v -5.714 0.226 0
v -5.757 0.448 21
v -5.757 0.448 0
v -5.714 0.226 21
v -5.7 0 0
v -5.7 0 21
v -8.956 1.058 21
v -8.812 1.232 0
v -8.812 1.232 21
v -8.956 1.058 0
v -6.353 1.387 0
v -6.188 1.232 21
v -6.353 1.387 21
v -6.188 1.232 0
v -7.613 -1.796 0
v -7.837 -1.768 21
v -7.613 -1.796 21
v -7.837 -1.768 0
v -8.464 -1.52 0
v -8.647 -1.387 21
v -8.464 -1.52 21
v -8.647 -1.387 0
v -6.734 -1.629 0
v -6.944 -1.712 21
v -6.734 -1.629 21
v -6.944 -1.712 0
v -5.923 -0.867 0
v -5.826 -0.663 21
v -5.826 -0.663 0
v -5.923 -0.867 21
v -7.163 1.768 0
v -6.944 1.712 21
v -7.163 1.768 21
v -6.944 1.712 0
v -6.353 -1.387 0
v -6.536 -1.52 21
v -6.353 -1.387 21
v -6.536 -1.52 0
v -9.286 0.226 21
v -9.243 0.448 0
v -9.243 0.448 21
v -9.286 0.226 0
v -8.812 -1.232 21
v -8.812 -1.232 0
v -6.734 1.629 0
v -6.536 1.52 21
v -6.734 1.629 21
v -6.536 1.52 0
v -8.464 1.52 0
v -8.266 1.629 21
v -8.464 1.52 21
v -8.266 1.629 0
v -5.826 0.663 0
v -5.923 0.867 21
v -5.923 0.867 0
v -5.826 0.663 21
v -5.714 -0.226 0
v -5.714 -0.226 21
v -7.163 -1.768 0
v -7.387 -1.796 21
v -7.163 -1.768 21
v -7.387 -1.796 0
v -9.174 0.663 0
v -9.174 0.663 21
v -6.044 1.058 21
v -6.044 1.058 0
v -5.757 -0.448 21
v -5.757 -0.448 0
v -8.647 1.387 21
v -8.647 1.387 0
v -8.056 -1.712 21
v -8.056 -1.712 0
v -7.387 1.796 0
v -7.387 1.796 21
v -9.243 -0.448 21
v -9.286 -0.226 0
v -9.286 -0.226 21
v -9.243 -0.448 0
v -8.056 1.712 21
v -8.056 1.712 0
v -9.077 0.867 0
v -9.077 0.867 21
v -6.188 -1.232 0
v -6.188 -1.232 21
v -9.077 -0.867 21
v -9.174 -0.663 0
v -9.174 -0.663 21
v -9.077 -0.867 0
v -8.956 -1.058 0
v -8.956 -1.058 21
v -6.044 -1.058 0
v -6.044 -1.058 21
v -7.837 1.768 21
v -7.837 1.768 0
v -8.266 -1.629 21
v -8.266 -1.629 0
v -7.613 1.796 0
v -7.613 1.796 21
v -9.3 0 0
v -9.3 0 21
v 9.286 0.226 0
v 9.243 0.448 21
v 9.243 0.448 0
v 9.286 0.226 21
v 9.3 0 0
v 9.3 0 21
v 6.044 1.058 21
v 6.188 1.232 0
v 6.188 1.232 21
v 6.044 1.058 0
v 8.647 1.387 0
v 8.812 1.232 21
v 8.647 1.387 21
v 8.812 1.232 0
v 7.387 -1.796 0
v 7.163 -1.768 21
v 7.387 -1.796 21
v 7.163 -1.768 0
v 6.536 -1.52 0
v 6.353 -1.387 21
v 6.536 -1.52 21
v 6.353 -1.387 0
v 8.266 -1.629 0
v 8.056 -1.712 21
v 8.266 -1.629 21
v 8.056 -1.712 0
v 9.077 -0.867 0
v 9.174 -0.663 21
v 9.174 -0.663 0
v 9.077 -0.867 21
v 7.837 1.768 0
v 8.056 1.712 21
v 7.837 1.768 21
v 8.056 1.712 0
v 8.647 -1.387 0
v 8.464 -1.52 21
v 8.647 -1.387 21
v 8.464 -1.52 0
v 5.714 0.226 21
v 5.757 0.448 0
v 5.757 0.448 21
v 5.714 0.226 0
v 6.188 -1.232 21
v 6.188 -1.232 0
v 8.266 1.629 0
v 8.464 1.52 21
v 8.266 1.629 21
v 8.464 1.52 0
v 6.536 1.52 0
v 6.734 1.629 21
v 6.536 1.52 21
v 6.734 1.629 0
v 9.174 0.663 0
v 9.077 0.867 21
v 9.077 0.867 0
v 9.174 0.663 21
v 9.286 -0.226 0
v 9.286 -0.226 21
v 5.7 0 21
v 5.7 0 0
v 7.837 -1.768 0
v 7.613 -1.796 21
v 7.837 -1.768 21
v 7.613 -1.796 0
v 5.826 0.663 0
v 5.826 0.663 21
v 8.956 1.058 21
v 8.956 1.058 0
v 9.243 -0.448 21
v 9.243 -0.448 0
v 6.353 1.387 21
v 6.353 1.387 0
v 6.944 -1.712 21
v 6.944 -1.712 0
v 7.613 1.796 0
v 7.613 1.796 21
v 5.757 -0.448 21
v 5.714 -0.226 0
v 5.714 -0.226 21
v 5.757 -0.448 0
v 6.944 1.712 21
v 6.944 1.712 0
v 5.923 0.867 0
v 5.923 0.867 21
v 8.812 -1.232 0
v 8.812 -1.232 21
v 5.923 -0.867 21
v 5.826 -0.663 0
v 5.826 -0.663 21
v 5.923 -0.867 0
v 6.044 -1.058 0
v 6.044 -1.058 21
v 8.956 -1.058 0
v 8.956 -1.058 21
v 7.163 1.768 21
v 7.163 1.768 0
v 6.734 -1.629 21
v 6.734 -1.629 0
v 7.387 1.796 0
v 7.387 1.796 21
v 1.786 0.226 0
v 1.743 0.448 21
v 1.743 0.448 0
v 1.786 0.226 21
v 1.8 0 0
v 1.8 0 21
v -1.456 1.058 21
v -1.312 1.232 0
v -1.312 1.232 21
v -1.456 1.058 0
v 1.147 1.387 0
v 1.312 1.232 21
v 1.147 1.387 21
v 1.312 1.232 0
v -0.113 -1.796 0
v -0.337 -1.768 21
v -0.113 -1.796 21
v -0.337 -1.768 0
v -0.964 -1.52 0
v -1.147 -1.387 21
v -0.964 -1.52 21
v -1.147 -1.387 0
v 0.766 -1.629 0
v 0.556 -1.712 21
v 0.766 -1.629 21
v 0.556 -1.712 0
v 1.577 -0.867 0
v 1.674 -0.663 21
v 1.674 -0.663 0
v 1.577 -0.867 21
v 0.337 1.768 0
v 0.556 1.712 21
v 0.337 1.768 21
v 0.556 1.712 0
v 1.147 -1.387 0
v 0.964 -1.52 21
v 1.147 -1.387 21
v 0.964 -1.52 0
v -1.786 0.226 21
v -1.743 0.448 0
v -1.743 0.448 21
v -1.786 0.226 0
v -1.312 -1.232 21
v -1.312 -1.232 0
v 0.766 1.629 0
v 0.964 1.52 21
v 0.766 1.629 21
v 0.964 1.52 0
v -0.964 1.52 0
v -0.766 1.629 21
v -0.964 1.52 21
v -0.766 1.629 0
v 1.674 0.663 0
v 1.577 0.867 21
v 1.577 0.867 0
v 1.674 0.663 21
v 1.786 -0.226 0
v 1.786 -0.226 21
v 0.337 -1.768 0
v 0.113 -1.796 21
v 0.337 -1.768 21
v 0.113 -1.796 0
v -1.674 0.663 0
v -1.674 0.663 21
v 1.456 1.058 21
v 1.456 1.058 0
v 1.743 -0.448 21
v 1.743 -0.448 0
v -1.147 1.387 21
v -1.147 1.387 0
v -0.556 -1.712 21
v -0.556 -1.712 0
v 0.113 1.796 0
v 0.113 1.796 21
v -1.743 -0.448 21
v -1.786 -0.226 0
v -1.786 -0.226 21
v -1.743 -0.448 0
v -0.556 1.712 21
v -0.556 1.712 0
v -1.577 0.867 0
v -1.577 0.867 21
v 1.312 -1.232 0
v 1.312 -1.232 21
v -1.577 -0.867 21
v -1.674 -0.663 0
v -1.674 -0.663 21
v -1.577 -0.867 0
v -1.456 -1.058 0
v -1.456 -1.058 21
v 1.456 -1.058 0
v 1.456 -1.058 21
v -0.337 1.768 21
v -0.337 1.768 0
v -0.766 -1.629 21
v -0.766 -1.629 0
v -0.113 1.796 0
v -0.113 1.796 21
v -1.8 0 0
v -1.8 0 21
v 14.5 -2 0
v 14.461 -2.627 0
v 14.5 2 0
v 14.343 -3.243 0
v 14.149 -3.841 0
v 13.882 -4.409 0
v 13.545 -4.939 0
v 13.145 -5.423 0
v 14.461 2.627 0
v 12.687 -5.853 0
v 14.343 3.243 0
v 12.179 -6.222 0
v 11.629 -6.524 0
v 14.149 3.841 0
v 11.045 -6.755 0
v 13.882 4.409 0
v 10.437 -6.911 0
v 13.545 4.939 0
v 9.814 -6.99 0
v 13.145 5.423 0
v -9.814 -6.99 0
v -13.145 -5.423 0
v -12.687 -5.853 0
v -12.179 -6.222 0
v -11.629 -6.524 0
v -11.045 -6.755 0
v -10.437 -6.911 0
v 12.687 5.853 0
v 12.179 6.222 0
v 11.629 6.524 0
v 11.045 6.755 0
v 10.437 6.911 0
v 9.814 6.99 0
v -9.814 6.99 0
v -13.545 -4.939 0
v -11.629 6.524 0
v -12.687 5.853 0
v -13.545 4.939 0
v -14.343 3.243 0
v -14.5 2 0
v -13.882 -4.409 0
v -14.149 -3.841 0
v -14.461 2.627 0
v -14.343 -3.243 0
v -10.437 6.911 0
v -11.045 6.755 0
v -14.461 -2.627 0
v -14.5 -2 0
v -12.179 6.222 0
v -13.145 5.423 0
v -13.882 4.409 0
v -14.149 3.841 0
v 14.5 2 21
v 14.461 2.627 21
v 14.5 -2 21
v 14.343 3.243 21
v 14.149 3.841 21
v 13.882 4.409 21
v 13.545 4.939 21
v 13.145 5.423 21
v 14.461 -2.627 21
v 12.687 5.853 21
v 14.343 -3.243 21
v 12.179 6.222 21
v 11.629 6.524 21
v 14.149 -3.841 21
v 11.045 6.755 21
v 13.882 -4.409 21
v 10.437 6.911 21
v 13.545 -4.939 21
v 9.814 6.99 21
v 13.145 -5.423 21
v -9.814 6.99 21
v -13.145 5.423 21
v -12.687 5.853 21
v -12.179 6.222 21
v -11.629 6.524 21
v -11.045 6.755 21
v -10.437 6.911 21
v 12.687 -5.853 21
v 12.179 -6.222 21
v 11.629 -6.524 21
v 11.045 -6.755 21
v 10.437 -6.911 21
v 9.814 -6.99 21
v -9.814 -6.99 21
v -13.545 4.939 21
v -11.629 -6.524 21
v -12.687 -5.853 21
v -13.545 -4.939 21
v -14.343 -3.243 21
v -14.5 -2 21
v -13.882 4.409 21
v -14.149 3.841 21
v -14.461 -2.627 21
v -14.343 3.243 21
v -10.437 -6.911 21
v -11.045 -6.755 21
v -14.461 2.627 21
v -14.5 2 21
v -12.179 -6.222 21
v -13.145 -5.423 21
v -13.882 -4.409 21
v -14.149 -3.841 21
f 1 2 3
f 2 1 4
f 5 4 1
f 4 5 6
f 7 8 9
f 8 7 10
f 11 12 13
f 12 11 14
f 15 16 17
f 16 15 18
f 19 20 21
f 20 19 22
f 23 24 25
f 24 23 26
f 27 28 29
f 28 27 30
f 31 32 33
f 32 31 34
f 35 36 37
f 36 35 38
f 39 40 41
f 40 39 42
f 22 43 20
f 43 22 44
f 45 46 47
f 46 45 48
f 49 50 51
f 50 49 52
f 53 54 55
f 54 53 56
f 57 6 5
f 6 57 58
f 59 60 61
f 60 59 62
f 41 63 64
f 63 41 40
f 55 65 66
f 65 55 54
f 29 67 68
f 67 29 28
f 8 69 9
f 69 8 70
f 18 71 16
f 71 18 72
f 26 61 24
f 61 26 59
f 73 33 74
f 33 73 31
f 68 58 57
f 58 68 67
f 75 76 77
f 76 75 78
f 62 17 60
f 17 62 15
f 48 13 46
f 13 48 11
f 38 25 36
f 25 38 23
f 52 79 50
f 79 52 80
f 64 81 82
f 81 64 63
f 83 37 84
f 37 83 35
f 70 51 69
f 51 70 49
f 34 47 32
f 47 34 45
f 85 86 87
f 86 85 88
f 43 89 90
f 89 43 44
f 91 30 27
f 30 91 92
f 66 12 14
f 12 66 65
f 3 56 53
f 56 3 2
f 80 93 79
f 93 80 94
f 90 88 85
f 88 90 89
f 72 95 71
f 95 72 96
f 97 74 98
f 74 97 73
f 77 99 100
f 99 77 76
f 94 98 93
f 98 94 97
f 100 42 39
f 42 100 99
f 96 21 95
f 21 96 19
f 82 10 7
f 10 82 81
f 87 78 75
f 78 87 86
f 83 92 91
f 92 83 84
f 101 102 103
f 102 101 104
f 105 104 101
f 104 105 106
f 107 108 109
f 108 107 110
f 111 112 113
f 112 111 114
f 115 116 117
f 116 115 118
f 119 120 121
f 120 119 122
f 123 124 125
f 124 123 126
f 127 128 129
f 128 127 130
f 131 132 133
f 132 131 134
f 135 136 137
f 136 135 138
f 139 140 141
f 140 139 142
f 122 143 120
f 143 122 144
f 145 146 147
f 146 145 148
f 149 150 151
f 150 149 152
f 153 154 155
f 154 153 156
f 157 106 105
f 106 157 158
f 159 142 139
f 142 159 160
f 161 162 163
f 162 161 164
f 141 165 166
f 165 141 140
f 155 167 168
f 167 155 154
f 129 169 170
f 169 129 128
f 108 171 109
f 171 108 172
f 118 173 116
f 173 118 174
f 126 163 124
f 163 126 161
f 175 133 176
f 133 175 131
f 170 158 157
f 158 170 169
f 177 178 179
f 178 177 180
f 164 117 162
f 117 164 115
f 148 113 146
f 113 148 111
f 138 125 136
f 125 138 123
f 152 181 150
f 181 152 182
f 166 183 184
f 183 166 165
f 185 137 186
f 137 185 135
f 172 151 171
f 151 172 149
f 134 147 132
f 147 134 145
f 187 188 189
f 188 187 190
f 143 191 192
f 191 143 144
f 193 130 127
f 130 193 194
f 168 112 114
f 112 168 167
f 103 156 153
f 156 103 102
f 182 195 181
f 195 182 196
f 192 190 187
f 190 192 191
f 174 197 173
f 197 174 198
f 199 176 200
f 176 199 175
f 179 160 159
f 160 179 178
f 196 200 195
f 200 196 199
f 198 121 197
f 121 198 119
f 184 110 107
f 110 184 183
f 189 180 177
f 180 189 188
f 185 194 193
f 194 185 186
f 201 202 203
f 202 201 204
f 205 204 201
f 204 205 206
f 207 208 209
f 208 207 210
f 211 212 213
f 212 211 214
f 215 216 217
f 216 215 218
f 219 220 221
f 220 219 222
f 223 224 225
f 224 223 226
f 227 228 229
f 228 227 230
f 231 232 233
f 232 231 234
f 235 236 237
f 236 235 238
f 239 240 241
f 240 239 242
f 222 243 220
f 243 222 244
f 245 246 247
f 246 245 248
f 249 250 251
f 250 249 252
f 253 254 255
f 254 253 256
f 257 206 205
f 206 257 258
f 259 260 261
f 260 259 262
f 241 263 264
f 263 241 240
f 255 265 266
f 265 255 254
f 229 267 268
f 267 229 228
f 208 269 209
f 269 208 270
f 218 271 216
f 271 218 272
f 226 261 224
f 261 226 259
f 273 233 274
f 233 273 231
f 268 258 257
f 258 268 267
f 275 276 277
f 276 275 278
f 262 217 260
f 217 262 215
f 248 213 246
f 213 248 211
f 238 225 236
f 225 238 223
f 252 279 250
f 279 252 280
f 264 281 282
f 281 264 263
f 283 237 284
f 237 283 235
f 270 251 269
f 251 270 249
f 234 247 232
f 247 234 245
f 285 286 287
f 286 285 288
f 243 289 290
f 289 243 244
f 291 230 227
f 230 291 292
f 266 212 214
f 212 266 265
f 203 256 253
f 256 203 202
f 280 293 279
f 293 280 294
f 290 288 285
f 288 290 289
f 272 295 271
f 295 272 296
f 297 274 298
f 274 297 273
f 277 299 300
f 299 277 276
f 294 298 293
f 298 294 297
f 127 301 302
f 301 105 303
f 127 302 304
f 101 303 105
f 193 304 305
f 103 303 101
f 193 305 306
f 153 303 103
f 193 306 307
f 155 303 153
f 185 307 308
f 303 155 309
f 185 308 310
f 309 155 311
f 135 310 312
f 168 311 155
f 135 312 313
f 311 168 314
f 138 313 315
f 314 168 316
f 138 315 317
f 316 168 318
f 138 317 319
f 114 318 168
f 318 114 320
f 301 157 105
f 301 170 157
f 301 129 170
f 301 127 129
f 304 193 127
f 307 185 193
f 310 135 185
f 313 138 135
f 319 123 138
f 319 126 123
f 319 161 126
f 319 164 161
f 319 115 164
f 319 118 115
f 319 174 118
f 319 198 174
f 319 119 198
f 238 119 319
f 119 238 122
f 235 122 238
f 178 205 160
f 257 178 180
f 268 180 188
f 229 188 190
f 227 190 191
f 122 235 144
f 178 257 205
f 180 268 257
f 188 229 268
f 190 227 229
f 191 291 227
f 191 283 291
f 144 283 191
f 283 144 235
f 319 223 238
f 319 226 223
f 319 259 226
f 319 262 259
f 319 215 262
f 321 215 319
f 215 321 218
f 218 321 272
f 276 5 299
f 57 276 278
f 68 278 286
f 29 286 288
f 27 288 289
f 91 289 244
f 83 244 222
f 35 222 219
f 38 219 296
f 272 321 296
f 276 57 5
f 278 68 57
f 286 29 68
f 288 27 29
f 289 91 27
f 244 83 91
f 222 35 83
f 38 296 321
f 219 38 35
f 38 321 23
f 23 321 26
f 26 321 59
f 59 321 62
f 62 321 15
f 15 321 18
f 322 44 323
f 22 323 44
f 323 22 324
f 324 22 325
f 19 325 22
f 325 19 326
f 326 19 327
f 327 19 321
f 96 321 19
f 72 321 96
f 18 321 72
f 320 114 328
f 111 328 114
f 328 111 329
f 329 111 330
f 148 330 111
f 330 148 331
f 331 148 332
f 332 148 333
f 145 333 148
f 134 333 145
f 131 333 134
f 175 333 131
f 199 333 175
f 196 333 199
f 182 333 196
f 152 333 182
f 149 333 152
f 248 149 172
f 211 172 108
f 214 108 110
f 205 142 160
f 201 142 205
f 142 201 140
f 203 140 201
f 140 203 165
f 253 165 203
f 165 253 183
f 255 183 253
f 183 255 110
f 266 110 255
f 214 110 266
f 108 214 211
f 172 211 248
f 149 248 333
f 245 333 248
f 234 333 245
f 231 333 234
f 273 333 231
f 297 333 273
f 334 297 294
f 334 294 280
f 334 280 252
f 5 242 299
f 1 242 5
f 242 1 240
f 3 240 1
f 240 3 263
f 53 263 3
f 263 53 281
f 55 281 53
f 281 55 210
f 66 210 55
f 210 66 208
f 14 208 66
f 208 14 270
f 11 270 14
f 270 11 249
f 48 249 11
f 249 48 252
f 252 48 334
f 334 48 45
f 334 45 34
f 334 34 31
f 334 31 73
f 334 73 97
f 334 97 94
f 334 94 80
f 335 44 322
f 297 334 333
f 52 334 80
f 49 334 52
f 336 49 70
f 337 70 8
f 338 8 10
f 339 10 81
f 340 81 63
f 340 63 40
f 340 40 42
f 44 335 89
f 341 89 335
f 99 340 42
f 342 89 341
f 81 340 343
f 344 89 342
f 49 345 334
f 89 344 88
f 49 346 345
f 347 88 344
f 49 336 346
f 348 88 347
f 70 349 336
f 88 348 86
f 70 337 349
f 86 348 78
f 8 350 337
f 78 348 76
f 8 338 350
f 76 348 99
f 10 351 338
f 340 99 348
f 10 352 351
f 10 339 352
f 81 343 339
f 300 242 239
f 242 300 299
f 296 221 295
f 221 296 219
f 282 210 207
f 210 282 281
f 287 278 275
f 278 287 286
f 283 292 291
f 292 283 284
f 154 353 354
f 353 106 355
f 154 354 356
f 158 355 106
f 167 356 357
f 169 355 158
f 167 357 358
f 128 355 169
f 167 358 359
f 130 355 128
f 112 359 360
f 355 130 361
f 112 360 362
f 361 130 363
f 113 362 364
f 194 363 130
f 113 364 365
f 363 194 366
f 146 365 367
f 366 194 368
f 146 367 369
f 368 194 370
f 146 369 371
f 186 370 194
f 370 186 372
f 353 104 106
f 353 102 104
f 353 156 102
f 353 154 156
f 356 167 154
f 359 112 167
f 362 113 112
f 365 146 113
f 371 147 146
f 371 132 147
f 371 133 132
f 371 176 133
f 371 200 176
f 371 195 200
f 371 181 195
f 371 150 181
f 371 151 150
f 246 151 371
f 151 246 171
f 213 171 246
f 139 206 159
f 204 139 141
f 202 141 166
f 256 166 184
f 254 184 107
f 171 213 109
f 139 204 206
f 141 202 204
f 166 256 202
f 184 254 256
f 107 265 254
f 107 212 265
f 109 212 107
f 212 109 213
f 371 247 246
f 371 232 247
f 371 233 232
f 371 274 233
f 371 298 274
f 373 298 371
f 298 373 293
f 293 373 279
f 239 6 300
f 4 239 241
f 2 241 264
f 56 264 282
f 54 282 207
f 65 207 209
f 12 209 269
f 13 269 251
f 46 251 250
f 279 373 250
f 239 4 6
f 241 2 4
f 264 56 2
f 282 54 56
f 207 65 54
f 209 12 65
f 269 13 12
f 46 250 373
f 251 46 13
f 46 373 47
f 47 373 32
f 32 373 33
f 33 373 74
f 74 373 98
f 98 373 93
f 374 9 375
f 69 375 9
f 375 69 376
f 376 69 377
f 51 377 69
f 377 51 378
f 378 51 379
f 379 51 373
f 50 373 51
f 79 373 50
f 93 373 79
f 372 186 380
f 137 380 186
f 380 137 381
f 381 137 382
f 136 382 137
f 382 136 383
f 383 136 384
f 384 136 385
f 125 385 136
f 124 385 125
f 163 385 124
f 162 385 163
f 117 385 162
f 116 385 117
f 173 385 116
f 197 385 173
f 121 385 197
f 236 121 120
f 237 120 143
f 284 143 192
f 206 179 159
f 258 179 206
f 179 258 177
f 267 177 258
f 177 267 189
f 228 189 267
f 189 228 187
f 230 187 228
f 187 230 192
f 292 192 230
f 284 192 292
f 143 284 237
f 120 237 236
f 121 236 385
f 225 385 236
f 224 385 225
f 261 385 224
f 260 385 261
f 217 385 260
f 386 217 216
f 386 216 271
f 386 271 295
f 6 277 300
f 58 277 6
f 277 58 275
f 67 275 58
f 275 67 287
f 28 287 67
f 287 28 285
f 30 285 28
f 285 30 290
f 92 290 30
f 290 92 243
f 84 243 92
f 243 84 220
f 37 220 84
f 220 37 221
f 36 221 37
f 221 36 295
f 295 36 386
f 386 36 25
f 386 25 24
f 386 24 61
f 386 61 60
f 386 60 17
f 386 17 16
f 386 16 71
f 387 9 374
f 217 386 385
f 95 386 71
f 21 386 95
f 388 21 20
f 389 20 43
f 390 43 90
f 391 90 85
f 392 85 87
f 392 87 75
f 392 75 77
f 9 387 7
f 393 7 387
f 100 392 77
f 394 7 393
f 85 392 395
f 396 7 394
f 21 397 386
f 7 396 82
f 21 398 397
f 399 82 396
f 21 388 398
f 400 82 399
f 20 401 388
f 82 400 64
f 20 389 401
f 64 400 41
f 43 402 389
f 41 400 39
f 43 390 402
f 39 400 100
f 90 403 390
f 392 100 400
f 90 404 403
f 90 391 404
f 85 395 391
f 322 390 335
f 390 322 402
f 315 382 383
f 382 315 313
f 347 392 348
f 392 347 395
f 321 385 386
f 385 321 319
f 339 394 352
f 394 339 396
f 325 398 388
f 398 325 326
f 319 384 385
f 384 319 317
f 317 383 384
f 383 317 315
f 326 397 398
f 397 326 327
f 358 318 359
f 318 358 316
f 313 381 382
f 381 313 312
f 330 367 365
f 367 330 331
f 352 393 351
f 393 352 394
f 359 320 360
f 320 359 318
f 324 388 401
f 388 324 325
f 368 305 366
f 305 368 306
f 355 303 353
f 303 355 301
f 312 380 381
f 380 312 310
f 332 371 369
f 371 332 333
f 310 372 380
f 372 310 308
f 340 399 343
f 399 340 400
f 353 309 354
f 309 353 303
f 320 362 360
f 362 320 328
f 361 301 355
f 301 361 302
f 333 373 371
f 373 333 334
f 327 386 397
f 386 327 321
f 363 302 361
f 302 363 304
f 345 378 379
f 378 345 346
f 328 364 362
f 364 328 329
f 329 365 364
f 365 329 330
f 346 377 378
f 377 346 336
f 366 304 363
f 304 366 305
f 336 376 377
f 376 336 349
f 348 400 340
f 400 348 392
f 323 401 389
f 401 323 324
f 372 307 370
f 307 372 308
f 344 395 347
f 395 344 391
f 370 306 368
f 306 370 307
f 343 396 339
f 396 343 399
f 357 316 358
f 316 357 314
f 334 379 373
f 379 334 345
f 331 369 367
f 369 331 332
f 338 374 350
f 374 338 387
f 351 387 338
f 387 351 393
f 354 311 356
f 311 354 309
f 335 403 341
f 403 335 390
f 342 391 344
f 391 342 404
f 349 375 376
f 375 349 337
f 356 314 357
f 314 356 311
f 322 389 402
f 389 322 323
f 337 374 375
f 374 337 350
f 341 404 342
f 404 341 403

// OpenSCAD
$fn = 50;


difference() {
	union() {
		hull() {
			translate(v = [-9.5000000000, 2.0000000000, 0]) {
				cylinder(h = 21, r = 5);
			}
			translate(v = [9.5000000000, 2.0000000000, 0]) {
				cylinder(h = 21, r = 5);
			}
			translate(v = [-9.5000000000, -2.0000000000, 0]) {
				cylinder(h = 21, r = 5);
			}
			translate(v = [9.5000000000, -2.0000000000, 0]) {
				cylinder(h = 21, r = 5);
			}
		}
	}
	union() {
		translate(v = [-7.5000000000, 0.0000000000, -100.0000000000]) {
			cylinder(h = 200, r = 1.8000000000);
		}
		translate(v = [7.5000000000, 0.0000000000, -100.0000000000]) {
			cylinder(h = 200, r = 1.8000000000);
		}
		translate(v = [-7.5000000000, 0.0000000000, 0]) {
			cylinder(h = 21, r = 1.8000000000);
		}
		cylinder(h = 21, r = 1.8000000000);
		translate(v = [7.5000000000, 0.0000000000, 0]) {
			cylinder(h = 21, r = 1.8000000000);
		}
		translate(v = [-7.5000000000, 0.0000000000, 0]) {
			cylinder(h = 21, r = 1.8000000000);
		}
		cylinder(h = 21, r = 1.8000000000);
		translate(v = [7.5000000000, 0.0000000000, 0]) {
			cylinder(h = 21, r = 1.8000000000);
		}
		translate(v = [-7.5000000000, 0.0000000000, 0]) {
			cylinder(h = 21, r = 1.8000000000);
		}
		cylinder(h = 21, r = 1.8000000000);
		translate(v = [7.5000000000, 0.0000000000, 0]) {
			cylinder(h = 21, r = 1.8000000000);
		}
	}
}
